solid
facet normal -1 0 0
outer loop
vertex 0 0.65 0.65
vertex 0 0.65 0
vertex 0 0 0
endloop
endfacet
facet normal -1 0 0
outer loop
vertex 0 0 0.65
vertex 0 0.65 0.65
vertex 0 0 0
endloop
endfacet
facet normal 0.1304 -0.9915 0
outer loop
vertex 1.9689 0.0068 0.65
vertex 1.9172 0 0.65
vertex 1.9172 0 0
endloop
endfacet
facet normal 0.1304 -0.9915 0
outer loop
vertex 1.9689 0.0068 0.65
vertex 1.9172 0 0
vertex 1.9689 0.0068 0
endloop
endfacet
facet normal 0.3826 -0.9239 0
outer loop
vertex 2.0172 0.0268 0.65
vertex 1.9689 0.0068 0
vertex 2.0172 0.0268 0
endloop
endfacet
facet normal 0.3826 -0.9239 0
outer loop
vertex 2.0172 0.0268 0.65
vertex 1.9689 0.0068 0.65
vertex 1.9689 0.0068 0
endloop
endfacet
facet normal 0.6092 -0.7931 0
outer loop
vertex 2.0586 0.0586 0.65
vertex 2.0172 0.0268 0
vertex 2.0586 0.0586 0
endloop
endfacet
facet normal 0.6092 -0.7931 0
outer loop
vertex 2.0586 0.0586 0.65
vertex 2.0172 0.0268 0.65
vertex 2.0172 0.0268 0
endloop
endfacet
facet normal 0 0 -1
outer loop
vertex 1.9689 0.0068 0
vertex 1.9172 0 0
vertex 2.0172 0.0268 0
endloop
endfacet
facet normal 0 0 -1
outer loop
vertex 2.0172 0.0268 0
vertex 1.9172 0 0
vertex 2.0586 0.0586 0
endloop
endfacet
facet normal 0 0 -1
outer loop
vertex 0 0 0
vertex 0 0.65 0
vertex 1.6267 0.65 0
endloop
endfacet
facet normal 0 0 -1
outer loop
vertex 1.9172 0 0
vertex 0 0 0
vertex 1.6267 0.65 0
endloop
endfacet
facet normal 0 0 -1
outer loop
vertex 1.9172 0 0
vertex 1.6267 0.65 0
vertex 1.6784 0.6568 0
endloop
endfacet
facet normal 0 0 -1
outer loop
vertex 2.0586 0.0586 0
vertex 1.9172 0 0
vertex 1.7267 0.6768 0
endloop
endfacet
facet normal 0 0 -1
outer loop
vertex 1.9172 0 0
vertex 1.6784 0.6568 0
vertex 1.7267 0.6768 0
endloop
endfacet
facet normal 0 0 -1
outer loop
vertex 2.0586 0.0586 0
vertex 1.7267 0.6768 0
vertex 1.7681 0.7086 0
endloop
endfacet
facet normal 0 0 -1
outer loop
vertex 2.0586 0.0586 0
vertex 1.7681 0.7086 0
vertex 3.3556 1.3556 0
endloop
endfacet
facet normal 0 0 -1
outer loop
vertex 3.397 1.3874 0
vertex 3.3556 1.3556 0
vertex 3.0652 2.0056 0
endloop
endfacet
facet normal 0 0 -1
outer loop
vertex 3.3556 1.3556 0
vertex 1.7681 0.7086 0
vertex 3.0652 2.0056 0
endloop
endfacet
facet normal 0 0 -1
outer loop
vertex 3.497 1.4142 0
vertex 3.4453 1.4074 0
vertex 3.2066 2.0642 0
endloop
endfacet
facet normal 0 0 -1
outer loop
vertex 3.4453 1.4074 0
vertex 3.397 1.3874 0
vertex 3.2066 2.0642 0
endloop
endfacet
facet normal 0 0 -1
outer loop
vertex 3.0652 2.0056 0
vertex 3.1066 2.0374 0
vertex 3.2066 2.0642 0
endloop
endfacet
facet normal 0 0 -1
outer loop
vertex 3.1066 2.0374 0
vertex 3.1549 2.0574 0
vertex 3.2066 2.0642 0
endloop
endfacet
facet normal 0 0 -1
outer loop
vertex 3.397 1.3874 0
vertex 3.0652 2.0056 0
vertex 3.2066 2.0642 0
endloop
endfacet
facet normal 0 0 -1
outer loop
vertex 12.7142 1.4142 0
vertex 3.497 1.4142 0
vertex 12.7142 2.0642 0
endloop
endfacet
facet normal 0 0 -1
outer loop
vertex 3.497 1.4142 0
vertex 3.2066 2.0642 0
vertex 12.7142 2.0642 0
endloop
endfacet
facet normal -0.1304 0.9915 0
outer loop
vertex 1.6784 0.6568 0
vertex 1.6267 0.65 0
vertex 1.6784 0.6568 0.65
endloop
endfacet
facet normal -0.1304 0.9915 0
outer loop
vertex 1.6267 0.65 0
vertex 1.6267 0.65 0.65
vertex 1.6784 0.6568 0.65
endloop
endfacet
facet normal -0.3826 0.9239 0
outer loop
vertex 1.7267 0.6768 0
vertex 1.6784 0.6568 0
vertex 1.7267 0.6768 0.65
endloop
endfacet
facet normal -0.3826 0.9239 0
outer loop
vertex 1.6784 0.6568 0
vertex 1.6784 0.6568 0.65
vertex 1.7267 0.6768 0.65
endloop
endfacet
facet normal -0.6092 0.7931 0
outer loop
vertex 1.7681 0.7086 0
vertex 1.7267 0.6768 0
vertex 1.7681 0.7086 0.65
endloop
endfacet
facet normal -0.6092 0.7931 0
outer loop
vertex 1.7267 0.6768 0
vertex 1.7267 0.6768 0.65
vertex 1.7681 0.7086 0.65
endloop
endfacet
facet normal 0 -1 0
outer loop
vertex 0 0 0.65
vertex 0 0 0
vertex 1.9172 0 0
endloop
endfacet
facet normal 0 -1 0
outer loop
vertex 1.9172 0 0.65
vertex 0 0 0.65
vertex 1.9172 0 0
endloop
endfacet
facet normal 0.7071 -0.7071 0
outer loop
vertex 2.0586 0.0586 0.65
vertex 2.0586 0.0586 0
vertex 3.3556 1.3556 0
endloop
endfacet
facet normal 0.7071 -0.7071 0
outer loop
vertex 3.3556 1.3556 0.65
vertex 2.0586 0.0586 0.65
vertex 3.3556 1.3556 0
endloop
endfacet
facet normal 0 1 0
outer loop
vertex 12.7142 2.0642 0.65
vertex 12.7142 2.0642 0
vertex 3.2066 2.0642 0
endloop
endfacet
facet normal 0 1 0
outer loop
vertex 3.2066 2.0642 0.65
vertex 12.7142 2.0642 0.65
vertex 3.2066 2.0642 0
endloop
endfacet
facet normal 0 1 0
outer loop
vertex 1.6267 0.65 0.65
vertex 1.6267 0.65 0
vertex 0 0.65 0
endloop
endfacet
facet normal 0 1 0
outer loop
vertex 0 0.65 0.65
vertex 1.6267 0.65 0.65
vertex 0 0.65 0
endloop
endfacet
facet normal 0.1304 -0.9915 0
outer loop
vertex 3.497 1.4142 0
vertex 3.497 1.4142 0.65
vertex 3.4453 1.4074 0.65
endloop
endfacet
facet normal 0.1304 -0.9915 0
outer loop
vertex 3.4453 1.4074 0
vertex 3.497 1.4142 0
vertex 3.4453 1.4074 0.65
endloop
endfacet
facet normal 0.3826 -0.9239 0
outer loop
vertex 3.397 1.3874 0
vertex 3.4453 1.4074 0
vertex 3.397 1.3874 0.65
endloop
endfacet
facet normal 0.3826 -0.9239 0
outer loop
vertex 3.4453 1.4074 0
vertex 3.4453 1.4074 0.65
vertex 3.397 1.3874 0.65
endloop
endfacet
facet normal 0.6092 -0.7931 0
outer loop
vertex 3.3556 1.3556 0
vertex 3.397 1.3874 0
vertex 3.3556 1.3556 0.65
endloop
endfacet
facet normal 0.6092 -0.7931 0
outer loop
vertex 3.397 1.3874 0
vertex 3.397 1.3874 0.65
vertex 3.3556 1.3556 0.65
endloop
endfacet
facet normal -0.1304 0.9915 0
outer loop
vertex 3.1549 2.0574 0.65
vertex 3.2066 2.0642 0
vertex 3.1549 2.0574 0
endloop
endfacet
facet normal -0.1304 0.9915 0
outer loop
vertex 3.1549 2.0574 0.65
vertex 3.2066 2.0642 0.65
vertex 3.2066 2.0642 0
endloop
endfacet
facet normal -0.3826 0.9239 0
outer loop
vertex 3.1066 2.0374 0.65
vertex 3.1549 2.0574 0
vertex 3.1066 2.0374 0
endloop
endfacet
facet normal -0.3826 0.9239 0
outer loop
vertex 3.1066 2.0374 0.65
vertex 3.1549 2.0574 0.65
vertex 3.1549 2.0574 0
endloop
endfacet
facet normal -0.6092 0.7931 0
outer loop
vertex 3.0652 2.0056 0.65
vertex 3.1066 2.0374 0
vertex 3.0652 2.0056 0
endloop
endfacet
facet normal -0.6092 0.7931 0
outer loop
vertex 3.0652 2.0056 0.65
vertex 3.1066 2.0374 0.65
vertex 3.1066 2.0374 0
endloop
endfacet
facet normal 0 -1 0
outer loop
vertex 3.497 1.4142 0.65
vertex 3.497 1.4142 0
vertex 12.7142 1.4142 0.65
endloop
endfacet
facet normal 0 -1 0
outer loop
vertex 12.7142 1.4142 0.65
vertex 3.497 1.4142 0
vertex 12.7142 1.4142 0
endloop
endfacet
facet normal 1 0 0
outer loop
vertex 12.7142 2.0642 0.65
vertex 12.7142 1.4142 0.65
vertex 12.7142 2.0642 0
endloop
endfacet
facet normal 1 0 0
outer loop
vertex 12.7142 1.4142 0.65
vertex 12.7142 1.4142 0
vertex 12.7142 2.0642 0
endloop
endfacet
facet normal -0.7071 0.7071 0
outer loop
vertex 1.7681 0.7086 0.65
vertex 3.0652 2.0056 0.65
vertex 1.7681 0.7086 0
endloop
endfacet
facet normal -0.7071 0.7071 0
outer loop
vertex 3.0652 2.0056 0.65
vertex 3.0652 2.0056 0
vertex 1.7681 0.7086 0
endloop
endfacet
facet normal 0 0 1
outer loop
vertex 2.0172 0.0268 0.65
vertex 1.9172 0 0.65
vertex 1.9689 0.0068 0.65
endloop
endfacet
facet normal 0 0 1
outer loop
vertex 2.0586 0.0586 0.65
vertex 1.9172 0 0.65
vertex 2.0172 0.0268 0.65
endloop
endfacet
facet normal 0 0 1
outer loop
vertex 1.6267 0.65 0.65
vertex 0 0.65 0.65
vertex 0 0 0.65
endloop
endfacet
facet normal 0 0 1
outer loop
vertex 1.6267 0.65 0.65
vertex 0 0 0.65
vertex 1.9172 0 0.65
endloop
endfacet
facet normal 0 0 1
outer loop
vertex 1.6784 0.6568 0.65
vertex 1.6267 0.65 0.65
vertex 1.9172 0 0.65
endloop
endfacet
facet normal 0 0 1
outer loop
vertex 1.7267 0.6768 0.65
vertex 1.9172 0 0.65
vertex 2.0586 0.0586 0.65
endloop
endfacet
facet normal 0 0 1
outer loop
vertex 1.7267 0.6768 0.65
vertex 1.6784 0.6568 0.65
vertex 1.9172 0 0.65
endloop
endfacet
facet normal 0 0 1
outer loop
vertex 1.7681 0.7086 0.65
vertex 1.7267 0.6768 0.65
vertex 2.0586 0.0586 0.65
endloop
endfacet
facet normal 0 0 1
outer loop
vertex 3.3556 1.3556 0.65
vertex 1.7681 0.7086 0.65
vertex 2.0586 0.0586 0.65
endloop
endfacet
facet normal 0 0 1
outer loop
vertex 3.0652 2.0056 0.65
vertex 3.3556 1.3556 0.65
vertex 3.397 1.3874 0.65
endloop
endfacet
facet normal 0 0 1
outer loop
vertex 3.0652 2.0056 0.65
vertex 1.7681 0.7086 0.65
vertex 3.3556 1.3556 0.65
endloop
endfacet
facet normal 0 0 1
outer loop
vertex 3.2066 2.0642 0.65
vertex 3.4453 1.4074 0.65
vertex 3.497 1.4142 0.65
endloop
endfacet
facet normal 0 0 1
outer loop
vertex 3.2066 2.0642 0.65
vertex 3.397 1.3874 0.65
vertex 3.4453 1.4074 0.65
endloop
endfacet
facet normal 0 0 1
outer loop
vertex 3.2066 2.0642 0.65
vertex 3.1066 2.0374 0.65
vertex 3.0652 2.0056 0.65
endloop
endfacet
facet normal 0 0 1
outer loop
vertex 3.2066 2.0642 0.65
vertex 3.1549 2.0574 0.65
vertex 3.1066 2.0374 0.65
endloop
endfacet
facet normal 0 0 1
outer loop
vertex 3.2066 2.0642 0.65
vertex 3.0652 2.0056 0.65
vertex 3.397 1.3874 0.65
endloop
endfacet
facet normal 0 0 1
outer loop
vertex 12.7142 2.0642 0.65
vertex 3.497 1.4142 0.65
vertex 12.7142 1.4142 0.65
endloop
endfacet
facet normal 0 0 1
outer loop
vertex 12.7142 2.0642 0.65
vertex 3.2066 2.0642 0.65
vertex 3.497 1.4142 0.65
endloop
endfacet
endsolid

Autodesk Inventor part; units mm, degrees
ref_plane "YZ Plane" through (0, 0, 0) normal (1, 0, 0) x (0, 1, 0)
ref_plane "XZ Plane" through (0, 0, 0) normal (0, 1, 0) x (-1, 0, 0)
ref_plane "XY Plane" through (0, 0, 0) normal (0, 0, 1) x (1, 0, 0)
sketch "Skizze1" plane through (0, 0, 0) normal (0, 0, 1) x (1, 0, 0)
  line L0 (0, 0) -> (2, 0)
  line L1 (2, 0) -> (3.4142, 1.4142)
  line L2 (3.4142, 1.4142) -> (12.7142, 1.4142)
  line L3 (12.7142, 1.4142) -> (12.7142, 2.0642)
  line L4 (12.7142, 2.0642) -> (3.1238, 2.0642)
  line L5 (3.1238, 2.0642) -> (1.7095, 0.65)
  line L6 (1.7095, 0.65) -> (0, 0.65)
  line L7 (0, 0.65) -> (0, 0)
  dimension "d0" = 2
  dimension "d1" = 2
  dimension "d2" = 9.3
  dimension "d3" = 0.65
  dimension "d4" = 0.65
  dimension "d5" = 135
  dimension "d6" = 0.665
extrude "Extrusion1" add sketch "Skizze1" along normal blind 0.65
fillet "Rundung1" radius 0.2 4 edges at (2, 0, 0.325) (1.7095, 0.65, 0.325) (3.1238, 2.0642, 0.325) (3.4142, 1.4142, 0.325)
equation "\"Biegeradius\" = Stärke"
equation "\"BreiteBiegungsfreistellung\" = Stärke"
equation "\"TiefeBiegungsfreistellung\" = 0.5 * Stärke"
equation "\"GrößeEckenfreistellung\" = 4 * Stärke"
equation "\"MinimalRest\" = 2 * Stärke"
equation "\"Übergangsradius\" = Biegeradius"
equation "\"JacobiRadiusGröße\" = Biegeradius"
equation "\"Abstandsgröße\" = Stärke"
equation "\"Stärke\" = 0.5"
properties part number "Pin"
